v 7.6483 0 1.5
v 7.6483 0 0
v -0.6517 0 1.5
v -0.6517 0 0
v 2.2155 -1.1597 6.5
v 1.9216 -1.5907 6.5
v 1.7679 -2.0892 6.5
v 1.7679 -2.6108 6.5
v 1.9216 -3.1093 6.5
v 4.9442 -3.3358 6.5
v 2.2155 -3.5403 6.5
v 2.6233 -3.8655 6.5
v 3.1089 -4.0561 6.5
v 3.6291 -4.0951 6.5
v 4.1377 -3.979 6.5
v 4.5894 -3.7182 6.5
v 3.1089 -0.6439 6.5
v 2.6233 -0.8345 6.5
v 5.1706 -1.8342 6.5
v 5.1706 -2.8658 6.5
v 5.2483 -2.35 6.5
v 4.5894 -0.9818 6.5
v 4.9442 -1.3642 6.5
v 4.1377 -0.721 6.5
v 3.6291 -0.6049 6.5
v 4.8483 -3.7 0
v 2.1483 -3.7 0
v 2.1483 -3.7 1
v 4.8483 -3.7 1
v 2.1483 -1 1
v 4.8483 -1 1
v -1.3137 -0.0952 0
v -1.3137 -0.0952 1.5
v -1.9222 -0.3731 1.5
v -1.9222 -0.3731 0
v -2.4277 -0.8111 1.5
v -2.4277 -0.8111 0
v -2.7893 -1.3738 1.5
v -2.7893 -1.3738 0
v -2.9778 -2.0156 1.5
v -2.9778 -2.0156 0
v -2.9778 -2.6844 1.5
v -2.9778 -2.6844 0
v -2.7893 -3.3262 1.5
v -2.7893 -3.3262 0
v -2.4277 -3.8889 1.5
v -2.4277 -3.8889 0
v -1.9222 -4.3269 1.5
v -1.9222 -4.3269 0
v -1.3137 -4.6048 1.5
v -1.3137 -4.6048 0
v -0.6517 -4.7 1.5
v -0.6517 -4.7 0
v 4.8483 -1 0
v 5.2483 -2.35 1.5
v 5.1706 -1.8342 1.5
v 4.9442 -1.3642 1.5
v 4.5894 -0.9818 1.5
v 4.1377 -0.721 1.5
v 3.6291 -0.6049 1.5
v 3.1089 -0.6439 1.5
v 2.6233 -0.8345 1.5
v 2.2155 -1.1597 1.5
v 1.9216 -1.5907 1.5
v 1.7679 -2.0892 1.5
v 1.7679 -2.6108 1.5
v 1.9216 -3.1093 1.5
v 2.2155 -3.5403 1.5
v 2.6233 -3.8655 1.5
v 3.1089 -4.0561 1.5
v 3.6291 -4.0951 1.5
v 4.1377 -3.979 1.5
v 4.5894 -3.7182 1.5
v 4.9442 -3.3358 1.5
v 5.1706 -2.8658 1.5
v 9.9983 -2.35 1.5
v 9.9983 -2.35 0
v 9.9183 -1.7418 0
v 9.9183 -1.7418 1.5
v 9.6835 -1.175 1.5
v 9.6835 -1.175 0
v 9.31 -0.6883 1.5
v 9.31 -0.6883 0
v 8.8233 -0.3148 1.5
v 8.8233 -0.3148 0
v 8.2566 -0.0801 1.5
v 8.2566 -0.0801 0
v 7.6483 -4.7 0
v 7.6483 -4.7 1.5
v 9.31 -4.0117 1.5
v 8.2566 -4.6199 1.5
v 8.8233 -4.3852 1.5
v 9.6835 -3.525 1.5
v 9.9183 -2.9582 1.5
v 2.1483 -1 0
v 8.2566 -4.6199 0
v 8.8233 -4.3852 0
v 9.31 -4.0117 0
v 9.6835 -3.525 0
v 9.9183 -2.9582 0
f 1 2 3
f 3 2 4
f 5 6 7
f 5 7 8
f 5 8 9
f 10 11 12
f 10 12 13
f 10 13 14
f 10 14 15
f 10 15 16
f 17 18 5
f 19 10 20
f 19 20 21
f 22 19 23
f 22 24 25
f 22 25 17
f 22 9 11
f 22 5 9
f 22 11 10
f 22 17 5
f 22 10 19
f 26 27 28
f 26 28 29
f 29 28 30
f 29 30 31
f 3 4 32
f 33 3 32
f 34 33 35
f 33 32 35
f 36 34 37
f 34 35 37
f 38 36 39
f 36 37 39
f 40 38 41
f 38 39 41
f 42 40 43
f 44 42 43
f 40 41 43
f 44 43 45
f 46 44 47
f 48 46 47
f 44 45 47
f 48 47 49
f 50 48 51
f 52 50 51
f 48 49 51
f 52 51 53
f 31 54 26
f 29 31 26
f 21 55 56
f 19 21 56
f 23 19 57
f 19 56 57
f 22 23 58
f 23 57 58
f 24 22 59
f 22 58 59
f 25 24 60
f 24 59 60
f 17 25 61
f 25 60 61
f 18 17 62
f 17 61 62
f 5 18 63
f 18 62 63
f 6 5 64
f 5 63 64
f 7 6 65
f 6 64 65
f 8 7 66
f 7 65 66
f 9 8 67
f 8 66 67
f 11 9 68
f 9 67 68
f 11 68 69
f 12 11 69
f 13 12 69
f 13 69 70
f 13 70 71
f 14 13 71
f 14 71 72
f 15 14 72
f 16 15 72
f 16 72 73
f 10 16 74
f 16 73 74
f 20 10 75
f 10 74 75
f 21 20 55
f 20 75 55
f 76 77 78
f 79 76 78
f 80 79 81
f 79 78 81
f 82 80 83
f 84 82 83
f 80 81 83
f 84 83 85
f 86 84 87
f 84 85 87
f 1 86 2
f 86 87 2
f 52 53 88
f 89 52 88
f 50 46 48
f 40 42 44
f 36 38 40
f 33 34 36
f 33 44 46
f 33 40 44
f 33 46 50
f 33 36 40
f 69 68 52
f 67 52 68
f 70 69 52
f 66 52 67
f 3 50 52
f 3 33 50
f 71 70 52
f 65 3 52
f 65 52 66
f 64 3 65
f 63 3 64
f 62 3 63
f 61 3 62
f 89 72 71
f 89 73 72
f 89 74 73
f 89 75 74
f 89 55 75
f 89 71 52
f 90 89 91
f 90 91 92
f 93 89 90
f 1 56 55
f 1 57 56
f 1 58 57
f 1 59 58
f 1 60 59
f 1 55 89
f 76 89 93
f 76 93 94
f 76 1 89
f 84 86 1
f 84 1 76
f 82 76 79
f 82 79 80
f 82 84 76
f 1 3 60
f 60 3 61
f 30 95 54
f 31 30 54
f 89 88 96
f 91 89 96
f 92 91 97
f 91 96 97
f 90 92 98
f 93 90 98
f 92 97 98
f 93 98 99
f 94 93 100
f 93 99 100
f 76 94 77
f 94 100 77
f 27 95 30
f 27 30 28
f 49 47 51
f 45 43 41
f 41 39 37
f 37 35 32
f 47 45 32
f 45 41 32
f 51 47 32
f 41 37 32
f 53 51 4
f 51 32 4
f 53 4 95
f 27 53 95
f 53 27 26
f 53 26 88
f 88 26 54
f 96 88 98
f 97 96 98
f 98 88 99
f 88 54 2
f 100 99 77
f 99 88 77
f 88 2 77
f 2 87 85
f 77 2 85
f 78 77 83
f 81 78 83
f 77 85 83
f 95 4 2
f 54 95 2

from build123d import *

# Parameters (mm, degrees)
F1_DEPTH = 1.5
F2_R     = 1.75
F3_DEPTH = 5
F4_W     = 2.7
F4_H     = 2.7
F5_DEPTH = 1


with BuildPart() as f1:
    # F0 (on Top) → F1 (new body)
    with BuildSketch(Plane.XY):
        with BuildLine():
            Line((-0.651671, -4.7), (-0.651671, 0))
            ThreePointArc((-0.651671, 0), (-3.001671, -2.35), (-0.651671, -4.7))
        make_face()
        with BuildLine():
            ThreePointArc((1.698329, -2.35), (1.01003, -0.688299), (-0.651671, 0))
            Line((-0.651671, 0), (-0.651671, -4.7))
            ThreePointArc((-0.651671, -4.7), (1.01003, -4.011701), (1.698329, -2.35))
        make_face()
        with BuildLine():
            Line((7.648329, 0), (-0.651671, 0))
            ThreePointArc((-0.651671, 0), (1.01003, -0.688299), (1.698329, -2.35))
            ThreePointArc((1.698329, -2.35), (1.01003, -4.011701), (-0.651671, -4.7))
            Line((-0.651671, -4.7), (7.648329, -4.7))
            ThreePointArc((7.648329, -4.7), (5.298329, -2.35), (7.648329, 0))
        make_face()
        with BuildLine():
            ThreePointArc((9.998329, -2.35), (9.31003, -0.688299), (7.648329, 0))
            Line((7.648329, 0), (7.648329, -4.7))
            ThreePointArc((7.648329, -4.7), (9.31003, -4.011701), (9.998329, -2.35))
        make_face()
        with BuildLine():
            Line((7.648329, -4.7), (7.648329, 0))
            ThreePointArc((7.648329, 0), (5.298329, -2.35), (7.648329, -4.7))
        make_face()
    extrude(amount=F1_DEPTH)

    # F2 (on face) → F3 (join)
    with BuildSketch(Plane.XY.offset(1.5)):
        with Locations((3.498329, -2.35)):
            Circle(F2_R)
    extrude(amount=F3_DEPTH)

    # F4 (on face) → F5 (cut)
    with BuildSketch(Plane(origin=(0, 0, 0), x_dir=(1, 0, 0), z_dir=(0, 0, -1))):
        with Locations((3.498329, 2.35)):
            Rectangle(F4_W, F4_H)
    extrude(amount=-F5_DEPTH, mode=Mode.SUBTRACT)


solid = f1.part
